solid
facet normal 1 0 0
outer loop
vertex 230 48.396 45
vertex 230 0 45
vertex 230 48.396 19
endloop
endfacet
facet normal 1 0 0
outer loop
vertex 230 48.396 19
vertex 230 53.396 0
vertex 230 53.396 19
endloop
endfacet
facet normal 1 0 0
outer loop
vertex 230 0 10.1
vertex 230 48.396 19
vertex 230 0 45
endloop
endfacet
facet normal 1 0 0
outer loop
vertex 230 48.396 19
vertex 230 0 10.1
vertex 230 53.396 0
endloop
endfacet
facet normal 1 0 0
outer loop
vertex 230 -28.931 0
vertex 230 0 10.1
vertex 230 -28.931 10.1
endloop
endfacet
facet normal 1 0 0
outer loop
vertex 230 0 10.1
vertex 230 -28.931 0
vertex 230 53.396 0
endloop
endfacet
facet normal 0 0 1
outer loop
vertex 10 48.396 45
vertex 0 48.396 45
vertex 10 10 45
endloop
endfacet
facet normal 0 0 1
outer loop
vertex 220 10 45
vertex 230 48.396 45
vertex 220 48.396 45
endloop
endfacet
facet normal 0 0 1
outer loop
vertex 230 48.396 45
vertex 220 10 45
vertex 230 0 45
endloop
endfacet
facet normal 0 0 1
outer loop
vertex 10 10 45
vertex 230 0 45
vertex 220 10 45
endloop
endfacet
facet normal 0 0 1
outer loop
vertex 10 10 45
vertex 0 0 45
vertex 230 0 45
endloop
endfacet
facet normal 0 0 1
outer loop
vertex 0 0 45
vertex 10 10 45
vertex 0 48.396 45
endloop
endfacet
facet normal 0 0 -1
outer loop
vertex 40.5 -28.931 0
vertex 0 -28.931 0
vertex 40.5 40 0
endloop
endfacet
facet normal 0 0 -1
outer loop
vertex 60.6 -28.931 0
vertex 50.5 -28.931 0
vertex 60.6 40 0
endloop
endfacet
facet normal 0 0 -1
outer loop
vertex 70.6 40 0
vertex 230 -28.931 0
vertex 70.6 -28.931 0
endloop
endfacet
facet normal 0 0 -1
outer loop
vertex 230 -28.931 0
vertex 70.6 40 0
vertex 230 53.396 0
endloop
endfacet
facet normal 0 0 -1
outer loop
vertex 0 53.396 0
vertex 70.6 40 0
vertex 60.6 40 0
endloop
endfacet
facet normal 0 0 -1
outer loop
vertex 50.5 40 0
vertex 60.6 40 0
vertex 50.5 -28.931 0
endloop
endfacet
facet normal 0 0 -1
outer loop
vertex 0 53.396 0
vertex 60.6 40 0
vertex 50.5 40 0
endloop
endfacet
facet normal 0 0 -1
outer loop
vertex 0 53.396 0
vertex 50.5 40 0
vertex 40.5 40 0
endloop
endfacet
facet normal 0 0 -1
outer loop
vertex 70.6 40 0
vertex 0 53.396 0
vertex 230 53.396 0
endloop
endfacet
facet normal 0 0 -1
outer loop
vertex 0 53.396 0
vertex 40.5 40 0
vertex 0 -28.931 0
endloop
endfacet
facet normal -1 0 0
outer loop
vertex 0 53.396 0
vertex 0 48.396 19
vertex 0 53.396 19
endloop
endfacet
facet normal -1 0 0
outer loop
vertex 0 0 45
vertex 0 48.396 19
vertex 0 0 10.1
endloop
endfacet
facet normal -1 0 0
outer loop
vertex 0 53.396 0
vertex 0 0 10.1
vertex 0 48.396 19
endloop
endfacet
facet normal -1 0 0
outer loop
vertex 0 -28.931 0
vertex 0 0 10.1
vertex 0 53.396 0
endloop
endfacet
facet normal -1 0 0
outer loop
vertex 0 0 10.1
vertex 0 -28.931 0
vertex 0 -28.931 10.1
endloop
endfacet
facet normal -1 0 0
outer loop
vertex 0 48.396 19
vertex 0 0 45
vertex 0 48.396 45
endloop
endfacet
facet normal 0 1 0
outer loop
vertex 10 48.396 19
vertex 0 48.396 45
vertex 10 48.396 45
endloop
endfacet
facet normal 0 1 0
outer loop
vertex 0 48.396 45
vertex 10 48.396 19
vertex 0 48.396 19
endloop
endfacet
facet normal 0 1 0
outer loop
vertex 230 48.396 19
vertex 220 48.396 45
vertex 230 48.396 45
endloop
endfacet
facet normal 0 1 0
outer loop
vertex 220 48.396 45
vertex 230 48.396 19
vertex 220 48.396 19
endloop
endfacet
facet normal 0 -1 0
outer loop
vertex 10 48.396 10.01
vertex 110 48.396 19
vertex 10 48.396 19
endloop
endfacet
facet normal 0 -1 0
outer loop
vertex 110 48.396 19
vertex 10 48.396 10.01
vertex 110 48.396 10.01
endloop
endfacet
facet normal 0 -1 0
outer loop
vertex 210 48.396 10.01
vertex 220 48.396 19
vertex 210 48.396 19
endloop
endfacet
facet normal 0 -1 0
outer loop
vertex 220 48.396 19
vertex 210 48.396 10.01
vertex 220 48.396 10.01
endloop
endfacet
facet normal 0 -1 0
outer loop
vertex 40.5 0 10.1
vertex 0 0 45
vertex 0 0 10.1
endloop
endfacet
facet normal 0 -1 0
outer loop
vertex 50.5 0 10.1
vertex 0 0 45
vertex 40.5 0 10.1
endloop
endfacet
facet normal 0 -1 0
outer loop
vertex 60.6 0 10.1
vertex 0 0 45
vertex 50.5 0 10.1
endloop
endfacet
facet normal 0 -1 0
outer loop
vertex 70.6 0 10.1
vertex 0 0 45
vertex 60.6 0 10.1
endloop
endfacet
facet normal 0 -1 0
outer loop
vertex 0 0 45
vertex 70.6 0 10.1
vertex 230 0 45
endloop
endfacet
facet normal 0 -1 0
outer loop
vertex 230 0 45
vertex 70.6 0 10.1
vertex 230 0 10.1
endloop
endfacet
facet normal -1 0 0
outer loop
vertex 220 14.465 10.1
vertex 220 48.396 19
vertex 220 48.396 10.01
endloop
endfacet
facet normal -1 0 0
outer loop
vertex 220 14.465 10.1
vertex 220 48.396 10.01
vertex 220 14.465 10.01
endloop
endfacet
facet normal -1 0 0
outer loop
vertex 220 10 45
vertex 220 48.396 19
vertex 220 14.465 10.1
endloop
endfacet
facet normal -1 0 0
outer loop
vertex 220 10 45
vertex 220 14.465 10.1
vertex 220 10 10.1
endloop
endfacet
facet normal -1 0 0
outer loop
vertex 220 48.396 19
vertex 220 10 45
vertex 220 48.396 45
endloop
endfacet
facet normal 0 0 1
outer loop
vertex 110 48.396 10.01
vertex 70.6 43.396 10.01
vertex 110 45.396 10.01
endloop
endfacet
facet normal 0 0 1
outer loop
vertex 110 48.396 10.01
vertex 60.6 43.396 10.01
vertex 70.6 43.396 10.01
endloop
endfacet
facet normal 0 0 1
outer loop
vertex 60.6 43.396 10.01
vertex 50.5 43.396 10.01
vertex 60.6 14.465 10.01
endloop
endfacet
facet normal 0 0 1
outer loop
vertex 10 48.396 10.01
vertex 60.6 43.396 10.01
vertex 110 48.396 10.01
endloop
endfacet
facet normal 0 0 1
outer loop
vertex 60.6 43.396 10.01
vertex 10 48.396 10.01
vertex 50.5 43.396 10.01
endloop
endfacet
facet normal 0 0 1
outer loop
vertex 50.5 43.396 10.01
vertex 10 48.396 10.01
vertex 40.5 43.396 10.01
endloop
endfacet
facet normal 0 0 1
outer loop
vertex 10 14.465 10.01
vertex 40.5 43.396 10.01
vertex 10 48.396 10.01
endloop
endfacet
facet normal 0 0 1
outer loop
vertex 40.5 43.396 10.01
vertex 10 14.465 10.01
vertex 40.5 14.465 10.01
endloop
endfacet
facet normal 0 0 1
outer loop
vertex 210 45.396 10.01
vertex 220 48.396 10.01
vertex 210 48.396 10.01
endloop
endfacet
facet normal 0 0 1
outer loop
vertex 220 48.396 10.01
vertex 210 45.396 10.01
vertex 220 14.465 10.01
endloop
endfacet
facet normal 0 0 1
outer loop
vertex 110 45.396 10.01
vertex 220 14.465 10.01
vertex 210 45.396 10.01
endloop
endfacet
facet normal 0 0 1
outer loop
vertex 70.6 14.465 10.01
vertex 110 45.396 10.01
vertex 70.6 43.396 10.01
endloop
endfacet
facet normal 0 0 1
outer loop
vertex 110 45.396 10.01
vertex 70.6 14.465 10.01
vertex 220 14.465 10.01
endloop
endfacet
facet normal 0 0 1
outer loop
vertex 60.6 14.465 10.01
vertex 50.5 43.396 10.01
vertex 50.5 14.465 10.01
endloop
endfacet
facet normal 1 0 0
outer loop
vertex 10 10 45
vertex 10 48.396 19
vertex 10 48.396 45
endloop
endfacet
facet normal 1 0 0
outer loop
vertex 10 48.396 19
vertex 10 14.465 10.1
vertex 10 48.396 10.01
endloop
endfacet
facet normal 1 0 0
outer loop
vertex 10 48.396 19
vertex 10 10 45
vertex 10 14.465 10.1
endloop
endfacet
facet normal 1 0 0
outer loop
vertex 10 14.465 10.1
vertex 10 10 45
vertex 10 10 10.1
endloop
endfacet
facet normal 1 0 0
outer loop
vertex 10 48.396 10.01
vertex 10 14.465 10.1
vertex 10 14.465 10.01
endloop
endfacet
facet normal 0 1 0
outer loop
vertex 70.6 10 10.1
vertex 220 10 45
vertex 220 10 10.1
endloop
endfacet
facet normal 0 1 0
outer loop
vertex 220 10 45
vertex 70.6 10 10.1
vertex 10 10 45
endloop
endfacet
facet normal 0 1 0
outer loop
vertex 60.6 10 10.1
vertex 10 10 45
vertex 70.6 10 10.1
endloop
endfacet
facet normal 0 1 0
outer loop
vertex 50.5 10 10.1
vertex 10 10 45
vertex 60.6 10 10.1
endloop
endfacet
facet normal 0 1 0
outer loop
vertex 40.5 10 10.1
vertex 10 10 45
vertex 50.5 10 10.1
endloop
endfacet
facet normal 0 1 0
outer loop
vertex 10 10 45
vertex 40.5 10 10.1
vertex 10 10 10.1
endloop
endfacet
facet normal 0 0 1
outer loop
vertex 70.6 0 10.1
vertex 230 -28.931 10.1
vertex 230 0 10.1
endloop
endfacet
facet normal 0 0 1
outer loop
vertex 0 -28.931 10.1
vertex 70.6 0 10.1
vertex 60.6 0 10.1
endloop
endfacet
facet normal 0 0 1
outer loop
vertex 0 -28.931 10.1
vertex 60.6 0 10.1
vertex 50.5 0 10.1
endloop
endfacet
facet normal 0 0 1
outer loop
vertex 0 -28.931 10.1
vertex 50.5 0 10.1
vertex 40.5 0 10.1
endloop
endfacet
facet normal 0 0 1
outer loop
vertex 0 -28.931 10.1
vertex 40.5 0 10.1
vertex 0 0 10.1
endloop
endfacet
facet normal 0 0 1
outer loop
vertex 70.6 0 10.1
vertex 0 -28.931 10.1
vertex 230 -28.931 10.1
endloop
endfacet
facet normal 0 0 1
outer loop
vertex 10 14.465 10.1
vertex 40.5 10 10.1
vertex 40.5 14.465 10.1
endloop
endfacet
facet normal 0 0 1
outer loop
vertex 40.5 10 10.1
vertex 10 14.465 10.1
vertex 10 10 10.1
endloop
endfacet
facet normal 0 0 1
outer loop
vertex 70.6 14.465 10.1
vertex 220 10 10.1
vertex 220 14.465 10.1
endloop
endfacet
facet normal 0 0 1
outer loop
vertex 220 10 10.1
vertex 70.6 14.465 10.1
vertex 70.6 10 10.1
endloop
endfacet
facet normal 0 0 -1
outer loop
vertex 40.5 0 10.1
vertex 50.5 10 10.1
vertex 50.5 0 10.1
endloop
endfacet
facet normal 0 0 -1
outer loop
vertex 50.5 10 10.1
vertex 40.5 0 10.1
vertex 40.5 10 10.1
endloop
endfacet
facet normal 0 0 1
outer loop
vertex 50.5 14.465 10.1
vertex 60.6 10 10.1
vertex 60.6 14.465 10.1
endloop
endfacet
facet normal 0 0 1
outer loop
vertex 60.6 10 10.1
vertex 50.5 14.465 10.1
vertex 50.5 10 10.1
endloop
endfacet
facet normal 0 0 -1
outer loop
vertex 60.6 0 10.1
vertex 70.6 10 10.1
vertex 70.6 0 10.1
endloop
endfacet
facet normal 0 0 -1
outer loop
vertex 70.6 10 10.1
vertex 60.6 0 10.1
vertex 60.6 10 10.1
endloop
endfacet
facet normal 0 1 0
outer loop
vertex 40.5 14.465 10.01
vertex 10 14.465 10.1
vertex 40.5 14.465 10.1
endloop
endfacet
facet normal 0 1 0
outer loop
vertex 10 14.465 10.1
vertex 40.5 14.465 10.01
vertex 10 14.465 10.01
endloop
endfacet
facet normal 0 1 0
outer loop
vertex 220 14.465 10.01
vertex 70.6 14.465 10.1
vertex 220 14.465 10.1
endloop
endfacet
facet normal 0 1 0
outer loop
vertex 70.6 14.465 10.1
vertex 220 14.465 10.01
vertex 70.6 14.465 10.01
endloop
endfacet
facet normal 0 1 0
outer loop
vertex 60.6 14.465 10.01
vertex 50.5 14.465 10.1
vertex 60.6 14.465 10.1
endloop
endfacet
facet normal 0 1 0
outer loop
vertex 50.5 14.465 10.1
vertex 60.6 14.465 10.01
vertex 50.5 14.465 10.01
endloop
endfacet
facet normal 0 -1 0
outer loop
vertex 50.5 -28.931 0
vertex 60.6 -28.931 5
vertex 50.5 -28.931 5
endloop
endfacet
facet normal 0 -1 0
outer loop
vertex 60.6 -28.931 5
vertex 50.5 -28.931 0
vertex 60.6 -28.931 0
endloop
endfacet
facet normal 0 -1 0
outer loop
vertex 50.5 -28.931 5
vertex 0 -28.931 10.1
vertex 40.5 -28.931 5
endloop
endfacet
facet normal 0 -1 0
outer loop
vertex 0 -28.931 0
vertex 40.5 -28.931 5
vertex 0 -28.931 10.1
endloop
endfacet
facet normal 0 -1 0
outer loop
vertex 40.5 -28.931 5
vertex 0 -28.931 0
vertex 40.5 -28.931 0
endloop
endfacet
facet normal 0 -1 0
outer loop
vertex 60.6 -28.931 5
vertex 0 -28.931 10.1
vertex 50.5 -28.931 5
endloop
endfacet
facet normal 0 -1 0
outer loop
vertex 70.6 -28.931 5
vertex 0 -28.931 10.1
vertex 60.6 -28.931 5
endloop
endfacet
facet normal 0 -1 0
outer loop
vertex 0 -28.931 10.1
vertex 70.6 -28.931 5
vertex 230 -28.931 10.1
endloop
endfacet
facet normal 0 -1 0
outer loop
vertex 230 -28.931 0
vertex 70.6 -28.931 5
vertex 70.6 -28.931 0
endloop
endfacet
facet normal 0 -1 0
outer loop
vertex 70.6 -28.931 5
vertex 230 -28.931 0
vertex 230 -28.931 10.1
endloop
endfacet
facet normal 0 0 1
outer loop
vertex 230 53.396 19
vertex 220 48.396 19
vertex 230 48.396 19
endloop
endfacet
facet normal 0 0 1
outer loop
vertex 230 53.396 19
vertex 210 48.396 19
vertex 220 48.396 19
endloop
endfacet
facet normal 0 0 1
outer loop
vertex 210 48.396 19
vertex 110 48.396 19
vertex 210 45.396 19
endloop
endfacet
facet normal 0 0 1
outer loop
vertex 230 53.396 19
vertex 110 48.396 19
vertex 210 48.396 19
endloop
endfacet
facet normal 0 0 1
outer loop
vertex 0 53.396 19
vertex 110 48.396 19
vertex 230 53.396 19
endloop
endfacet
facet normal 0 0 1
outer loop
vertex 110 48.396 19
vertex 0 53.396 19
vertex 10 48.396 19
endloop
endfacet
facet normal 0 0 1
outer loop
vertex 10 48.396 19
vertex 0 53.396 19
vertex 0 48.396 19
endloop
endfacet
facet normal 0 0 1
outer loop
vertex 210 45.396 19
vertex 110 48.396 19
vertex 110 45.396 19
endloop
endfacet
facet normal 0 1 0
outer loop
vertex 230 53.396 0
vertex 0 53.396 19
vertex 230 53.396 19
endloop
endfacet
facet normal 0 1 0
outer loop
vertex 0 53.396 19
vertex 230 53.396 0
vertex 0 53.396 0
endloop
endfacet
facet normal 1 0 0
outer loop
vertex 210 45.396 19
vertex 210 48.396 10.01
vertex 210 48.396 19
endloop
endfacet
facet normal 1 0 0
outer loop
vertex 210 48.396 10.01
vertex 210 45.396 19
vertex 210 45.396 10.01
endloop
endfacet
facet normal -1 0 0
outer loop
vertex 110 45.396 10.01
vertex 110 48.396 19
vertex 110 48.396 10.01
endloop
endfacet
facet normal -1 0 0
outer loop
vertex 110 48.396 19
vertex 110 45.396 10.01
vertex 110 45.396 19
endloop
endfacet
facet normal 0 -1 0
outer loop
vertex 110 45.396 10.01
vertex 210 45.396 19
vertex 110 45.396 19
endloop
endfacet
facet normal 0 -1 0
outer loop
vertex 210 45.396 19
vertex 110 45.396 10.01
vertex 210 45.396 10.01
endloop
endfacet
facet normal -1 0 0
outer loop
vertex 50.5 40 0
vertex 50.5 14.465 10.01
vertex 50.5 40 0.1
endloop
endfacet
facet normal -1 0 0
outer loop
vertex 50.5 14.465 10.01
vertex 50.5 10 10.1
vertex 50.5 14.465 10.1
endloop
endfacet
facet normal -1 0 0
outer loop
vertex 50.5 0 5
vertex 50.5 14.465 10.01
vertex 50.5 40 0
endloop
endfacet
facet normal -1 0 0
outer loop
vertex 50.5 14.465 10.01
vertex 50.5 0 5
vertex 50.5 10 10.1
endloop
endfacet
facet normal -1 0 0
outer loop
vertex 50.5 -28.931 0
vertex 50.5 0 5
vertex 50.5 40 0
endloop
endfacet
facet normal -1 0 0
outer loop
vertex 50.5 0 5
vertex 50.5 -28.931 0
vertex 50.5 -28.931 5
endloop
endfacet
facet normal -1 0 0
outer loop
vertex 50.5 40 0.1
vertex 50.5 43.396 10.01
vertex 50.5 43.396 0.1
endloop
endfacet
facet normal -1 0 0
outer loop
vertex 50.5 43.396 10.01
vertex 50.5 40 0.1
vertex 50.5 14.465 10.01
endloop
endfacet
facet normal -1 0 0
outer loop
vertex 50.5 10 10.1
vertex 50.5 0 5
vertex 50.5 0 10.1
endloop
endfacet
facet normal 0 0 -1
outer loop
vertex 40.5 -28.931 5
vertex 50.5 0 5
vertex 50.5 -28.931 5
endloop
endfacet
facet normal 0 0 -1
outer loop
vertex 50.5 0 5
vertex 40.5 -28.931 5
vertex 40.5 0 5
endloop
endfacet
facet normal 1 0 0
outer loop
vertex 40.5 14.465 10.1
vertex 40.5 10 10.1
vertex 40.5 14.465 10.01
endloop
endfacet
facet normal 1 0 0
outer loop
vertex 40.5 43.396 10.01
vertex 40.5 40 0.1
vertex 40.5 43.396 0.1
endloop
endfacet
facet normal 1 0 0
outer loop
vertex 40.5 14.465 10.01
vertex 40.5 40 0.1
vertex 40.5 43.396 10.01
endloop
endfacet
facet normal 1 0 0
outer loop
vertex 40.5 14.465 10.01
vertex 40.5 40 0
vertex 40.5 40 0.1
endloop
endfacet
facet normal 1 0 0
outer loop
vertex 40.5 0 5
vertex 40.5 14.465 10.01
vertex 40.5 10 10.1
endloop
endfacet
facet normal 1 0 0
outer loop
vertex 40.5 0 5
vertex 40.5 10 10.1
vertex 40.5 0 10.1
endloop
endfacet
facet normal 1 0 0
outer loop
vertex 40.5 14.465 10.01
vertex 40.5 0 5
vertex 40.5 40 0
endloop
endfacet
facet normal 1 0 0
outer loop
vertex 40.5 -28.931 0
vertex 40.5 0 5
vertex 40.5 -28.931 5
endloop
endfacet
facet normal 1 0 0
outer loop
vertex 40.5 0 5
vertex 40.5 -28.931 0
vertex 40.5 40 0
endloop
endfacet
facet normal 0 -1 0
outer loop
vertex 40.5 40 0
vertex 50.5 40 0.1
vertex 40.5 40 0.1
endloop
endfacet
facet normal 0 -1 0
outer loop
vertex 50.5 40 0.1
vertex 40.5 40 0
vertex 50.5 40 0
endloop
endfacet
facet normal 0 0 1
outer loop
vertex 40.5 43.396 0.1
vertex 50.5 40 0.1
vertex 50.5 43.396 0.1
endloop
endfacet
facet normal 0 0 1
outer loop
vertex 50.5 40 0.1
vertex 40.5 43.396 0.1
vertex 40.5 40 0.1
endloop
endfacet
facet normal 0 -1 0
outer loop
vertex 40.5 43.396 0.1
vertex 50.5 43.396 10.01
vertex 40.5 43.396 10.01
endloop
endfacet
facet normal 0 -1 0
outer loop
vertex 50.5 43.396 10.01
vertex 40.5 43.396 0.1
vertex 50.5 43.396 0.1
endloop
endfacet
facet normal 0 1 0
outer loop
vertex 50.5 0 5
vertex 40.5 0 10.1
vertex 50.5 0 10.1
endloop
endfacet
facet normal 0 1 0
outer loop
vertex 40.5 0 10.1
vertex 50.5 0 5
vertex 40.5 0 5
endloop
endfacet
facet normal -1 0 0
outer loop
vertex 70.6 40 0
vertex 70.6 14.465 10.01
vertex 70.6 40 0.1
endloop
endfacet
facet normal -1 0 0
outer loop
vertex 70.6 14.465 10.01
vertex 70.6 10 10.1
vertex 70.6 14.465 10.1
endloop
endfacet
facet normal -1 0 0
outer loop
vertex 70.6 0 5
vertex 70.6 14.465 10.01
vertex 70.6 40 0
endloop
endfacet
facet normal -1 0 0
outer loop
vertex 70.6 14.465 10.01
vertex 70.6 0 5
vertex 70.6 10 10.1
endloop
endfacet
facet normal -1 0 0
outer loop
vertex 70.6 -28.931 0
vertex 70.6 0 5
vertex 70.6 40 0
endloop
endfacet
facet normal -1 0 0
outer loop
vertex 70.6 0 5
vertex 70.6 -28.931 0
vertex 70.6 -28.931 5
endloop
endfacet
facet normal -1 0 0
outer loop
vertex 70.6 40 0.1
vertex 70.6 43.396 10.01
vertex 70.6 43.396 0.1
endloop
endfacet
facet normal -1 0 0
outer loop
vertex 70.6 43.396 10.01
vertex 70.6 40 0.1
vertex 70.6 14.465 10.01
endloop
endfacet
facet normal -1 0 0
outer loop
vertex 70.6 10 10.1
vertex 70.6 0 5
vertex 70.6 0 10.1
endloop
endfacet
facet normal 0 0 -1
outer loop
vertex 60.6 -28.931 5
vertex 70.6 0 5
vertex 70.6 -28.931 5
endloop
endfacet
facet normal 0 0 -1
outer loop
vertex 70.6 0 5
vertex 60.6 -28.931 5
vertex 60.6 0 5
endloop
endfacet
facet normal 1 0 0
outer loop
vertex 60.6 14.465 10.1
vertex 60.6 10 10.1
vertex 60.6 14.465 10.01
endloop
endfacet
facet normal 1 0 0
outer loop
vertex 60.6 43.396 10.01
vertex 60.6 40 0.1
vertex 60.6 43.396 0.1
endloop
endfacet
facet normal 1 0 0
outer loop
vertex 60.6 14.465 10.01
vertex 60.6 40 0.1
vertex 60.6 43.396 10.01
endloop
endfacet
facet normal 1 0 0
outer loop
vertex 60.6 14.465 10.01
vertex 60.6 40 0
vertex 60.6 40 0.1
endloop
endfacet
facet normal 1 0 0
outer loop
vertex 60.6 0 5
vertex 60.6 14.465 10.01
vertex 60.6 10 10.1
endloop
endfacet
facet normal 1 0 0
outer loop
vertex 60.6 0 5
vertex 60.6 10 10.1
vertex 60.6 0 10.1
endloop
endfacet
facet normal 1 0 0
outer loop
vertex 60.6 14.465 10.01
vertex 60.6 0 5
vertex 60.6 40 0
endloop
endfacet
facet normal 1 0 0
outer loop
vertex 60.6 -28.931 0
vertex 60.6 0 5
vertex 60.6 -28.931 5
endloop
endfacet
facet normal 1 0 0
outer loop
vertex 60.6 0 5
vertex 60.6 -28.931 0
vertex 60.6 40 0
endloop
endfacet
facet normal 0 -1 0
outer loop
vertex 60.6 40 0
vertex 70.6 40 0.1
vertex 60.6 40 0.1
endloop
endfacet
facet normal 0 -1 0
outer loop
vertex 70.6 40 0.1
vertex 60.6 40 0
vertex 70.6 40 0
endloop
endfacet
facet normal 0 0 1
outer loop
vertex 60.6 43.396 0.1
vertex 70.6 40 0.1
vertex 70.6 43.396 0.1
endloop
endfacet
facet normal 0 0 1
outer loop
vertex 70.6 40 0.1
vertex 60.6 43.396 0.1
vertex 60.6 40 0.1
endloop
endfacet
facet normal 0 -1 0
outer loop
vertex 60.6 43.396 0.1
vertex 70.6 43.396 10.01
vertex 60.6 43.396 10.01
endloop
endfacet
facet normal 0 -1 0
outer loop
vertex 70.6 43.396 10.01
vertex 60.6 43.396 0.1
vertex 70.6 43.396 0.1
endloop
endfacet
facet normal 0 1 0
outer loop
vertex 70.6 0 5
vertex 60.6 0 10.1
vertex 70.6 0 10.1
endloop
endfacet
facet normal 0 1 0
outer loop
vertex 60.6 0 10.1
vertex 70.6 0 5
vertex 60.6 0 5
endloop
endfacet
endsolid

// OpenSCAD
$fn=100;
MM = 25.42;
FUDGE = 1;

inkbird_width = 112 + 97 + FUDGE;
inkbird_depth = (3 + 3/8) * MM + FUDGE;
inkbird_heigth = 35; // (1 + 3/8) * MM + FUDGE;

thick = 10;

module make_box()
{
    translate([0, -inkbird_depth/3, 0])
    color("GREEN")
    cube([inkbird_width + thick *2 , inkbird_depth/2 , thick+.1], center = false);

    difference()
    {
        cube([inkbird_width + thick *2, (inkbird_depth + thick)/2, inkbird_heigth + thick], center = false);
        translate([thick, thick, thick +.01])
        cube([inkbird_width , inkbird_depth, inkbird_heigth], center = false);
    }

    translate([0, (inkbird_depth + thick)/2, 0])
    color("BLUE")
    cube([inkbird_width + thick *2 , thick/2 , thick + 9], center = false);

    // front display is not flat but 2 steps. Add shim to pin it against wall.
    SHIM_LEN = 120;
    SHIM_THICK = 3;
    color("MAGENTA")
    translate([inkbird_width - SHIM_LEN + 20, (inkbird_depth + thick)/2 - SHIM_THICK])
    cube([inkbird_width + thick - SHIM_LEN , thick/2 , thick + 9], center = false);
}

module thermo_hole(x_offset)
{
    translate([x_offset + thick/2 + FUDGE, -60/2, -5])
    cube([ thick, 70, 10]);

    color("CYAN")
    translate([x_offset + thick/2 + FUDGE, 0, +.1])
    cube([ thick , inkbird_depth/2, 10]);
}

difference()
{
    make_box();
    thermo_hole(34.5);
    thermo_hole(54.6);
   
}
